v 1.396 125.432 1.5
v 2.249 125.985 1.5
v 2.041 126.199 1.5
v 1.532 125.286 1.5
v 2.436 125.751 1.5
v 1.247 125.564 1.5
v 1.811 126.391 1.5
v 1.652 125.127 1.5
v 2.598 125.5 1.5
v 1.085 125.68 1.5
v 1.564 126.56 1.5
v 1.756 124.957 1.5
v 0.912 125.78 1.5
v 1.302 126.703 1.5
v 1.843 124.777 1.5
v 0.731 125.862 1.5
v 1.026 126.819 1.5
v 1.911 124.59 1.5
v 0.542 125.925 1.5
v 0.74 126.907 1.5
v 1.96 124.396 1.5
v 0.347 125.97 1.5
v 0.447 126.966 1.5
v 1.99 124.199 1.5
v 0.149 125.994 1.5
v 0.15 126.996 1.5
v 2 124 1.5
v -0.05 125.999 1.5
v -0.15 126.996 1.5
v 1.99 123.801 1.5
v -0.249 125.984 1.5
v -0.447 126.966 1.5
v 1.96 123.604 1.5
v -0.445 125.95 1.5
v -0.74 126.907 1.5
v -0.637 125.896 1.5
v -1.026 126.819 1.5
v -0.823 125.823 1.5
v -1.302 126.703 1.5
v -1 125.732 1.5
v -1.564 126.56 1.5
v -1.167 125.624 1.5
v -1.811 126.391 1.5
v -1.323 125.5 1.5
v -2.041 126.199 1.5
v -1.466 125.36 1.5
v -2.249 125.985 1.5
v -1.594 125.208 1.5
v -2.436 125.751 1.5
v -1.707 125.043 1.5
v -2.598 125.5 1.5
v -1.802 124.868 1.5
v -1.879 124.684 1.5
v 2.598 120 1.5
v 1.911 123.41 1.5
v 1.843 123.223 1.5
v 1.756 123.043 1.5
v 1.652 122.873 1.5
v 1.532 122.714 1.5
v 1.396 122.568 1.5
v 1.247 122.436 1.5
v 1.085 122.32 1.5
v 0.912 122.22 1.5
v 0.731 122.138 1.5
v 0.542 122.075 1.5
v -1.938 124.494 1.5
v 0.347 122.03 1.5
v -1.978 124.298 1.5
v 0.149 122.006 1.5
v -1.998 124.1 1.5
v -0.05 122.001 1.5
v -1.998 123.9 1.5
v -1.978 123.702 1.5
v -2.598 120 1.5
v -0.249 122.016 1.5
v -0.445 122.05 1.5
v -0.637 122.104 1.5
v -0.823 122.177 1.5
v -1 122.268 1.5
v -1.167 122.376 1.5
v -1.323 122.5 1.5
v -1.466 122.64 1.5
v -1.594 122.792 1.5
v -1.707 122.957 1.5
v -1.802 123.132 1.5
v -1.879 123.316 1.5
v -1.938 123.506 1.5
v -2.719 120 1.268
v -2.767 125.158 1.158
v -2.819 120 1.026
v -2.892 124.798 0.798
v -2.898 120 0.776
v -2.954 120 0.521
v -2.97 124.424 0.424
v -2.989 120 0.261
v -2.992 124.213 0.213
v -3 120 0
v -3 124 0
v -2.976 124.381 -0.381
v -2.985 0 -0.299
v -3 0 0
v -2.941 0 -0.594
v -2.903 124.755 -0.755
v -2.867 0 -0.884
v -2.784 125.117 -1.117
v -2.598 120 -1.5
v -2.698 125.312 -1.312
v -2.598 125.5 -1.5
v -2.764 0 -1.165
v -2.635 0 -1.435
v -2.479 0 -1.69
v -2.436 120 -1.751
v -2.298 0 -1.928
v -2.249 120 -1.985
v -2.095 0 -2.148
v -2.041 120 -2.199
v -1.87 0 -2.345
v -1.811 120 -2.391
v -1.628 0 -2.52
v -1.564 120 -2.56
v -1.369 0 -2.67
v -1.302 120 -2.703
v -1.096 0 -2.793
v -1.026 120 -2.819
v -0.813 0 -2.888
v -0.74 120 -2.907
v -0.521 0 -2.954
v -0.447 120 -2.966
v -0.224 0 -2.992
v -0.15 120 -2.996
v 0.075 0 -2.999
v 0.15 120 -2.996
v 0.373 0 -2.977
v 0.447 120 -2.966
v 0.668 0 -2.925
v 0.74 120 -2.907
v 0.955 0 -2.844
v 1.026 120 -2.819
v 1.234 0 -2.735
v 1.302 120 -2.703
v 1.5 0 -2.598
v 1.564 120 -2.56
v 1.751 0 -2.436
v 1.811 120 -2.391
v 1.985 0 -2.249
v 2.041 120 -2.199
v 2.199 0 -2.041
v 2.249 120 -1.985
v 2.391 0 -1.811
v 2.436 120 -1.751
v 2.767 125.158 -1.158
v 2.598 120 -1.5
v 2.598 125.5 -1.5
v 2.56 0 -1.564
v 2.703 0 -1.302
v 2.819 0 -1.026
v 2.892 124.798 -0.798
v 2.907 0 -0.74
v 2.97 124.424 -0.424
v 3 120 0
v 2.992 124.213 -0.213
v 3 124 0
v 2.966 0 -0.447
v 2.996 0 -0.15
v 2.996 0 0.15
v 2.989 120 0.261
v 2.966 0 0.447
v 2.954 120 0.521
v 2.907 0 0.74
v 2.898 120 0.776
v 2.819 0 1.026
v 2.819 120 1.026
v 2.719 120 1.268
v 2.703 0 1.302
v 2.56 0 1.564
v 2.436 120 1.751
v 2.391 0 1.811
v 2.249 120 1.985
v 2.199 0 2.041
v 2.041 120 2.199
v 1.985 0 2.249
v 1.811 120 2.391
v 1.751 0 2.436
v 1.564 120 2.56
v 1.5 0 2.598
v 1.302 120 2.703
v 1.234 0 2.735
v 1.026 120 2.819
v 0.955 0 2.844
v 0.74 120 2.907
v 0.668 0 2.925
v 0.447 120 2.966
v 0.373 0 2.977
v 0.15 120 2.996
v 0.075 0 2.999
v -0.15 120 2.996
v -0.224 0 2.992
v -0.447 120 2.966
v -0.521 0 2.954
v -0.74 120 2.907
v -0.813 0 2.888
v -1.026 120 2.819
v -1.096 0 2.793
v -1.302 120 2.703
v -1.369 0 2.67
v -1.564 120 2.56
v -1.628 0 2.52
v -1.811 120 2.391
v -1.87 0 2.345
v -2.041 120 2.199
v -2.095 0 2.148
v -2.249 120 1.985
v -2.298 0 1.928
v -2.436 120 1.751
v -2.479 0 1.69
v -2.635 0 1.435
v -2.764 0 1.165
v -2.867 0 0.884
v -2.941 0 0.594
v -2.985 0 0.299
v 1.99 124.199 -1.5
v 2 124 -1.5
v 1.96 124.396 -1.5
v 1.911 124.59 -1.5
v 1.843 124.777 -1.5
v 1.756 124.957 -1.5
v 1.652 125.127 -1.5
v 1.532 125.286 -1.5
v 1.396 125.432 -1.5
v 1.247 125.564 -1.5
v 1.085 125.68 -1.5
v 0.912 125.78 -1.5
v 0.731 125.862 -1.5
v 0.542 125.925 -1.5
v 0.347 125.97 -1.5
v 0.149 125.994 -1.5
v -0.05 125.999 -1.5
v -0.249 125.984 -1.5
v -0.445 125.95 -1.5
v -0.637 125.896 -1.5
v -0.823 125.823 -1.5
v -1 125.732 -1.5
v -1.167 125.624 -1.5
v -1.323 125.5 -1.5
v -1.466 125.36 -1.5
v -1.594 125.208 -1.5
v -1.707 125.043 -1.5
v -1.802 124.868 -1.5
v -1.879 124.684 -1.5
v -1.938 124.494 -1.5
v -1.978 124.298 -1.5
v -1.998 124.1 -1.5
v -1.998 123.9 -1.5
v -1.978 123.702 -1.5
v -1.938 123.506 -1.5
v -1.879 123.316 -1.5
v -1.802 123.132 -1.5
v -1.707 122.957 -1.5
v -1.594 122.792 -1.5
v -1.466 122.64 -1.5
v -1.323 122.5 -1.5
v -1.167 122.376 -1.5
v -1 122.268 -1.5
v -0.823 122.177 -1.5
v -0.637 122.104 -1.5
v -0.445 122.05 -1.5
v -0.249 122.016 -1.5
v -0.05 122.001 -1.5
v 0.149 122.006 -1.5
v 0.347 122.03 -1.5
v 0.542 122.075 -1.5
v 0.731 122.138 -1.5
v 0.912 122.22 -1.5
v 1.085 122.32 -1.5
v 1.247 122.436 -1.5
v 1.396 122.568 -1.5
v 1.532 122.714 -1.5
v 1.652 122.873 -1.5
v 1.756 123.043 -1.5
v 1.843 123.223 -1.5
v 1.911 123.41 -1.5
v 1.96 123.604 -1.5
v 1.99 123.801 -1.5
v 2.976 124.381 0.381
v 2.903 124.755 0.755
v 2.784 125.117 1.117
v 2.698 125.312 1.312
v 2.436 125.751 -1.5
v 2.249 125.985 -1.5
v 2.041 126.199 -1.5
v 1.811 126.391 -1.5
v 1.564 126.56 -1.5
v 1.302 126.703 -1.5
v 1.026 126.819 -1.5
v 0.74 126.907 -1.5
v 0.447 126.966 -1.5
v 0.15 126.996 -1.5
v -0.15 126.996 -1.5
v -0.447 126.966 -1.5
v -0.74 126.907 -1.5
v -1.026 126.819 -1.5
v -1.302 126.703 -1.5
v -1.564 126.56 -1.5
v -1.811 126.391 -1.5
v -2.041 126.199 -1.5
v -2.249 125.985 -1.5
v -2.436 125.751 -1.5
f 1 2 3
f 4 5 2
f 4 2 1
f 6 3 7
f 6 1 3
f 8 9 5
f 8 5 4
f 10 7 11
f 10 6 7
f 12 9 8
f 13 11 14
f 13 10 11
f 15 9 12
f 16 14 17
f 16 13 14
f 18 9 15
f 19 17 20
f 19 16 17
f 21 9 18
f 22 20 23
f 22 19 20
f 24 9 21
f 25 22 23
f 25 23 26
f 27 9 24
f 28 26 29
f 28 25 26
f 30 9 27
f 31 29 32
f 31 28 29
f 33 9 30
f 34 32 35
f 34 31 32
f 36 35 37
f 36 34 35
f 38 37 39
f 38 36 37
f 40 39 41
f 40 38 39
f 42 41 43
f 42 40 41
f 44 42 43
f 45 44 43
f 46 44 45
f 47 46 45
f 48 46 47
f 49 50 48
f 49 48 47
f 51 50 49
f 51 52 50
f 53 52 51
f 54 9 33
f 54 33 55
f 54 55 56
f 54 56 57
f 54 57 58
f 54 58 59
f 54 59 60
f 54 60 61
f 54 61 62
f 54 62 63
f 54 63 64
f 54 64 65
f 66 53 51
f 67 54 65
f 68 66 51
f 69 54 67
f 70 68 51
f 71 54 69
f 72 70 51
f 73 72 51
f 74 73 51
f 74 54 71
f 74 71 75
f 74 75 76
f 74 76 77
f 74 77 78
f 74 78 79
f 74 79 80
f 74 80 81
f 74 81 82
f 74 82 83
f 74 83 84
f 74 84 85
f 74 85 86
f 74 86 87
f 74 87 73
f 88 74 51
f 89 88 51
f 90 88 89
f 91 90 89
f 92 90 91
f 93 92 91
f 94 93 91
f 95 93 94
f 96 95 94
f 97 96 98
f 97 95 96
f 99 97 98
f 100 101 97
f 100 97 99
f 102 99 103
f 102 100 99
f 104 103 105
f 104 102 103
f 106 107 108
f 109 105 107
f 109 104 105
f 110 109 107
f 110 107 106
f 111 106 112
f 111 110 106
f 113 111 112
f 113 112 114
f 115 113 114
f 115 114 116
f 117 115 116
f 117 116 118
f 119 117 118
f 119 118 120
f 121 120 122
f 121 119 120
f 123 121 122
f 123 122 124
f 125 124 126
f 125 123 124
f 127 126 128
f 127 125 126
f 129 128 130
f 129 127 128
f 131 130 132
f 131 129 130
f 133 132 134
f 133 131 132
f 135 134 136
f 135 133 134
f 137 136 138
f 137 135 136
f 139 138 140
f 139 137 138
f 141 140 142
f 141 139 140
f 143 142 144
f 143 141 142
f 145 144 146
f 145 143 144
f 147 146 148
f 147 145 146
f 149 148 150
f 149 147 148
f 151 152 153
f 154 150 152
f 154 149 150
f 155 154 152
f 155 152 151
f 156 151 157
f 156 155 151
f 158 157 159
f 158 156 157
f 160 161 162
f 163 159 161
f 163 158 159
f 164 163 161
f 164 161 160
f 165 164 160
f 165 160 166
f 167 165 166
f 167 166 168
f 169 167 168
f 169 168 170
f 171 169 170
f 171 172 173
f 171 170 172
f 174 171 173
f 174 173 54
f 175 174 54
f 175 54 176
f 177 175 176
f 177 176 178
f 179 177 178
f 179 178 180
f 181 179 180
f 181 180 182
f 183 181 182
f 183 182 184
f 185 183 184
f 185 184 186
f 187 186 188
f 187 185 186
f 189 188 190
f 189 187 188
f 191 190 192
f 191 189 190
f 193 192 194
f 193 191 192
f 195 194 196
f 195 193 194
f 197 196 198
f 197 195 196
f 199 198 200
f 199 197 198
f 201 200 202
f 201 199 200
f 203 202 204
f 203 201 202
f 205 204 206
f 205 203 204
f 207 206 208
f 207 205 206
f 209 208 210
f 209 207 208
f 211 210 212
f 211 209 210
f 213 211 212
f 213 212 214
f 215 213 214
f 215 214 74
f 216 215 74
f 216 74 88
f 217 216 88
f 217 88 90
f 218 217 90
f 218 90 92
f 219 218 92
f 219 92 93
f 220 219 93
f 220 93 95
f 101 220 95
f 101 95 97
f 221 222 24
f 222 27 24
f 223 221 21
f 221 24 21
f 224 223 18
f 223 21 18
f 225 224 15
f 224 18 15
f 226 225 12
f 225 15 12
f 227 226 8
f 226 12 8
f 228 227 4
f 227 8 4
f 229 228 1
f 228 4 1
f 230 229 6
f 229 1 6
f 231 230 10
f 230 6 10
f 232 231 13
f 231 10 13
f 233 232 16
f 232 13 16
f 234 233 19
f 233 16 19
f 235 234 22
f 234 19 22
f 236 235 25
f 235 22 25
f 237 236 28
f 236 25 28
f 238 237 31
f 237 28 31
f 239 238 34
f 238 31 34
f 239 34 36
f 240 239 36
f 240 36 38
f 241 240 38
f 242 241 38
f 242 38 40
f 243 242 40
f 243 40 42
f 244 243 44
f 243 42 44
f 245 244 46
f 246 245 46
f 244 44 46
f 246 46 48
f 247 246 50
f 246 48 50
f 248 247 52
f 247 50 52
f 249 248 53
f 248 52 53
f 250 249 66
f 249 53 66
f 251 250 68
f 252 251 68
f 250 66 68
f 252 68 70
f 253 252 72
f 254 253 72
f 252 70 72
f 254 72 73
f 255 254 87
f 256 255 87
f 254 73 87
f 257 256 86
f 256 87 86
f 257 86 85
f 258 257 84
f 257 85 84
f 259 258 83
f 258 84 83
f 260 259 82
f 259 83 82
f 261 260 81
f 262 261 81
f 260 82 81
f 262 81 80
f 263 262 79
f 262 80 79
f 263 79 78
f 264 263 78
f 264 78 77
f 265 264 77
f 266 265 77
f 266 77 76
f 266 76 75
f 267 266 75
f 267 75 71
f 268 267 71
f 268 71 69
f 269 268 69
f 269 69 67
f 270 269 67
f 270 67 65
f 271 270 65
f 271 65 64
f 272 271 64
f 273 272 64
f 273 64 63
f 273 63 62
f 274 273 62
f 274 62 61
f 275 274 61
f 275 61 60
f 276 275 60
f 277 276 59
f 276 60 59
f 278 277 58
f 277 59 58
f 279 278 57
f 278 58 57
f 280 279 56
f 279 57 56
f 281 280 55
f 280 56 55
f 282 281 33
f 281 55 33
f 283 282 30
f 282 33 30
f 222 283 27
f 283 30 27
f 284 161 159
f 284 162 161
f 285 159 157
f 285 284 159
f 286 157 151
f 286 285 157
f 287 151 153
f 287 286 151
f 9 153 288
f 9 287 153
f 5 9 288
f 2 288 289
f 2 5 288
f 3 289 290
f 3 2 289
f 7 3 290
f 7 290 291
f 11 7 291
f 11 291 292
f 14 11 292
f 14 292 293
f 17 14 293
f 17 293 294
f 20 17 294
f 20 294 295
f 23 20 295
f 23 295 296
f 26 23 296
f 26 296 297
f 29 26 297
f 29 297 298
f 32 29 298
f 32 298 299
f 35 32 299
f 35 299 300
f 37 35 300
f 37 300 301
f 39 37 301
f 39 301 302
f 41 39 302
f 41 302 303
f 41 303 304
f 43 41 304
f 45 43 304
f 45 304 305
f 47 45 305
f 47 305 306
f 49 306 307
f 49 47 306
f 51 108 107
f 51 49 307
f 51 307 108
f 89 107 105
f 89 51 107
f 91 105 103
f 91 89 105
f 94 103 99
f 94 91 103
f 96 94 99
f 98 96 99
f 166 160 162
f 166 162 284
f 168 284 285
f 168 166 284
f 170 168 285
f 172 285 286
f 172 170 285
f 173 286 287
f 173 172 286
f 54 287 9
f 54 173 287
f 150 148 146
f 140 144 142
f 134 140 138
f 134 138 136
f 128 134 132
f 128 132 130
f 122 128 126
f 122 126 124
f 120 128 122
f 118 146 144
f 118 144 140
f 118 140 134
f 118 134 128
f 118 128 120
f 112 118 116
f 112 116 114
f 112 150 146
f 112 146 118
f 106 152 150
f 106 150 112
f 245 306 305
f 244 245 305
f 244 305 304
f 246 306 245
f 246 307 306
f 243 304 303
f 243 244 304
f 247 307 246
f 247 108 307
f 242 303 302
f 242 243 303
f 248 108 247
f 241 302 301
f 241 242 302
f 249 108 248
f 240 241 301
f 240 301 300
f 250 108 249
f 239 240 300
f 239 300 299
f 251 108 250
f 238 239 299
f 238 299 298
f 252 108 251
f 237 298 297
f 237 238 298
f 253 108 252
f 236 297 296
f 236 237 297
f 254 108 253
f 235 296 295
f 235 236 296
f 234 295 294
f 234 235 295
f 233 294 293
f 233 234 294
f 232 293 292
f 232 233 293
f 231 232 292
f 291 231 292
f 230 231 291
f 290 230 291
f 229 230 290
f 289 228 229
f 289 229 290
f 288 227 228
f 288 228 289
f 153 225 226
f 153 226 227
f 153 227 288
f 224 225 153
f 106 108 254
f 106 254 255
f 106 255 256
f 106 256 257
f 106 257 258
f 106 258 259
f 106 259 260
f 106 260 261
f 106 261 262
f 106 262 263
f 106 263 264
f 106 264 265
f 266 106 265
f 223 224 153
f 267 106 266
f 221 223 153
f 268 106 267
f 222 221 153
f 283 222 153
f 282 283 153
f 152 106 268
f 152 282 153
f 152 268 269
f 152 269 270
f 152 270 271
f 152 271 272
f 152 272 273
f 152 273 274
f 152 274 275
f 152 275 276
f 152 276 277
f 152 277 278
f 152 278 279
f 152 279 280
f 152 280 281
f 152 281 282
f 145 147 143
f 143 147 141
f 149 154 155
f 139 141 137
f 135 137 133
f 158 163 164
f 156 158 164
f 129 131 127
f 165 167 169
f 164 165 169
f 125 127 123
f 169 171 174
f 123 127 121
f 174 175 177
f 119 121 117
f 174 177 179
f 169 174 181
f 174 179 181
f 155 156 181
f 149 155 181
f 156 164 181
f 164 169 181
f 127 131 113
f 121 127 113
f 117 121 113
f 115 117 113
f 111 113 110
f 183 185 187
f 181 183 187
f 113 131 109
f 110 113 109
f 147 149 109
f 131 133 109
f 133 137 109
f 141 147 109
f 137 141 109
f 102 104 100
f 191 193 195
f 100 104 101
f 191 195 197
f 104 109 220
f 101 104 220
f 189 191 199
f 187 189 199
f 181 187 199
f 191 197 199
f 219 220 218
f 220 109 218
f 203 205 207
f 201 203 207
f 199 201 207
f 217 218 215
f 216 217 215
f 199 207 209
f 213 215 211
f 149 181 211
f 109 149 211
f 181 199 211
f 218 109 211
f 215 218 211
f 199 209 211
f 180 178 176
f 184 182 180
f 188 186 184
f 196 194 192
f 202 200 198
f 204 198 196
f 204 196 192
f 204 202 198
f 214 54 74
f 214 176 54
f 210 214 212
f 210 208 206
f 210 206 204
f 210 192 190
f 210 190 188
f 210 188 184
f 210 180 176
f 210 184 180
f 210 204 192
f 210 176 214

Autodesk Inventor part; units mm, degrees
ref_plane "YZ Plane" through (0, 0, 0) normal (1, 0, 0) x (0, 1, 0)
ref_plane "XZ Plane" through (0, 0, 0) normal (0, 1, 0) x (-1, 0, 0)
ref_plane "XY Plane" through (0, 0, 0) normal (0, 0, 1) x (1, 0, 0)
sketch "Sketch1" plane through (0, 0, 0) normal (0, 1, 0) x (-1, 0, 0)
  circle A0 centre (0, 0) radius 3
  dimension "d0" = 6
extrude "Extrusion1" add sketch "Sketch1" along normal blind 120
sketch "Sketch2" plane through (0, 120, 0) normal (0, 1, 0) x (1, 0, 0)
  circle A0 centre (0, 0) radius 3 projected
  circle A1 centre (0, 0) radius 3 projected
  line L0 (-2.5981, 1.5) -> (2.5981, 1.5)
  line L1 (2.5981, -1.5) -> (-2.5981, -1.5)
  line L2 (0, -1.5) -> (0, 1.5)
  dimension "d3" = 3
extrude "Extrusion2" add sketch "Sketch2" along normal blind 7 contours A0 L1 L2 L0 | L0 L2 L1 A0
sketch "Sketch3" plane through (-2.5981, 120, 1.5) normal (0, 0, 1) x (1, 0, 0)
  line L0 (5.5981, -120) -> (5.5981, 7) projected
  line L1 (-0.4019, -120) -> (-0.4019, 7) projected
  line L2 (-0.4019, 4) -> (5.5981, 4)
  circle A0 centre (2.5981, 4) radius 2
  line L3 (0, 7) -> (5.1962, 7) projected
  circle A1 centre (2.5981, 4) radius 3
  line L4 (0, 7) -> (-0.4019, 7) projected
  line L5 (-0.4019, 7) -> (5.5981, 7)
  point P0 (2.5981, -120)
  point P1 (2.5981, 7)
  point P2 (5.5981, 4)
  dimension "d6" = 4
extrude "Extrusion3" cut sketch "Sketch3" against normal blind 7 contours A1 L3 L5 L0 | A0 L2 | L2 A0 | L1 L4 L3 A1
properties part number "Shaft"
